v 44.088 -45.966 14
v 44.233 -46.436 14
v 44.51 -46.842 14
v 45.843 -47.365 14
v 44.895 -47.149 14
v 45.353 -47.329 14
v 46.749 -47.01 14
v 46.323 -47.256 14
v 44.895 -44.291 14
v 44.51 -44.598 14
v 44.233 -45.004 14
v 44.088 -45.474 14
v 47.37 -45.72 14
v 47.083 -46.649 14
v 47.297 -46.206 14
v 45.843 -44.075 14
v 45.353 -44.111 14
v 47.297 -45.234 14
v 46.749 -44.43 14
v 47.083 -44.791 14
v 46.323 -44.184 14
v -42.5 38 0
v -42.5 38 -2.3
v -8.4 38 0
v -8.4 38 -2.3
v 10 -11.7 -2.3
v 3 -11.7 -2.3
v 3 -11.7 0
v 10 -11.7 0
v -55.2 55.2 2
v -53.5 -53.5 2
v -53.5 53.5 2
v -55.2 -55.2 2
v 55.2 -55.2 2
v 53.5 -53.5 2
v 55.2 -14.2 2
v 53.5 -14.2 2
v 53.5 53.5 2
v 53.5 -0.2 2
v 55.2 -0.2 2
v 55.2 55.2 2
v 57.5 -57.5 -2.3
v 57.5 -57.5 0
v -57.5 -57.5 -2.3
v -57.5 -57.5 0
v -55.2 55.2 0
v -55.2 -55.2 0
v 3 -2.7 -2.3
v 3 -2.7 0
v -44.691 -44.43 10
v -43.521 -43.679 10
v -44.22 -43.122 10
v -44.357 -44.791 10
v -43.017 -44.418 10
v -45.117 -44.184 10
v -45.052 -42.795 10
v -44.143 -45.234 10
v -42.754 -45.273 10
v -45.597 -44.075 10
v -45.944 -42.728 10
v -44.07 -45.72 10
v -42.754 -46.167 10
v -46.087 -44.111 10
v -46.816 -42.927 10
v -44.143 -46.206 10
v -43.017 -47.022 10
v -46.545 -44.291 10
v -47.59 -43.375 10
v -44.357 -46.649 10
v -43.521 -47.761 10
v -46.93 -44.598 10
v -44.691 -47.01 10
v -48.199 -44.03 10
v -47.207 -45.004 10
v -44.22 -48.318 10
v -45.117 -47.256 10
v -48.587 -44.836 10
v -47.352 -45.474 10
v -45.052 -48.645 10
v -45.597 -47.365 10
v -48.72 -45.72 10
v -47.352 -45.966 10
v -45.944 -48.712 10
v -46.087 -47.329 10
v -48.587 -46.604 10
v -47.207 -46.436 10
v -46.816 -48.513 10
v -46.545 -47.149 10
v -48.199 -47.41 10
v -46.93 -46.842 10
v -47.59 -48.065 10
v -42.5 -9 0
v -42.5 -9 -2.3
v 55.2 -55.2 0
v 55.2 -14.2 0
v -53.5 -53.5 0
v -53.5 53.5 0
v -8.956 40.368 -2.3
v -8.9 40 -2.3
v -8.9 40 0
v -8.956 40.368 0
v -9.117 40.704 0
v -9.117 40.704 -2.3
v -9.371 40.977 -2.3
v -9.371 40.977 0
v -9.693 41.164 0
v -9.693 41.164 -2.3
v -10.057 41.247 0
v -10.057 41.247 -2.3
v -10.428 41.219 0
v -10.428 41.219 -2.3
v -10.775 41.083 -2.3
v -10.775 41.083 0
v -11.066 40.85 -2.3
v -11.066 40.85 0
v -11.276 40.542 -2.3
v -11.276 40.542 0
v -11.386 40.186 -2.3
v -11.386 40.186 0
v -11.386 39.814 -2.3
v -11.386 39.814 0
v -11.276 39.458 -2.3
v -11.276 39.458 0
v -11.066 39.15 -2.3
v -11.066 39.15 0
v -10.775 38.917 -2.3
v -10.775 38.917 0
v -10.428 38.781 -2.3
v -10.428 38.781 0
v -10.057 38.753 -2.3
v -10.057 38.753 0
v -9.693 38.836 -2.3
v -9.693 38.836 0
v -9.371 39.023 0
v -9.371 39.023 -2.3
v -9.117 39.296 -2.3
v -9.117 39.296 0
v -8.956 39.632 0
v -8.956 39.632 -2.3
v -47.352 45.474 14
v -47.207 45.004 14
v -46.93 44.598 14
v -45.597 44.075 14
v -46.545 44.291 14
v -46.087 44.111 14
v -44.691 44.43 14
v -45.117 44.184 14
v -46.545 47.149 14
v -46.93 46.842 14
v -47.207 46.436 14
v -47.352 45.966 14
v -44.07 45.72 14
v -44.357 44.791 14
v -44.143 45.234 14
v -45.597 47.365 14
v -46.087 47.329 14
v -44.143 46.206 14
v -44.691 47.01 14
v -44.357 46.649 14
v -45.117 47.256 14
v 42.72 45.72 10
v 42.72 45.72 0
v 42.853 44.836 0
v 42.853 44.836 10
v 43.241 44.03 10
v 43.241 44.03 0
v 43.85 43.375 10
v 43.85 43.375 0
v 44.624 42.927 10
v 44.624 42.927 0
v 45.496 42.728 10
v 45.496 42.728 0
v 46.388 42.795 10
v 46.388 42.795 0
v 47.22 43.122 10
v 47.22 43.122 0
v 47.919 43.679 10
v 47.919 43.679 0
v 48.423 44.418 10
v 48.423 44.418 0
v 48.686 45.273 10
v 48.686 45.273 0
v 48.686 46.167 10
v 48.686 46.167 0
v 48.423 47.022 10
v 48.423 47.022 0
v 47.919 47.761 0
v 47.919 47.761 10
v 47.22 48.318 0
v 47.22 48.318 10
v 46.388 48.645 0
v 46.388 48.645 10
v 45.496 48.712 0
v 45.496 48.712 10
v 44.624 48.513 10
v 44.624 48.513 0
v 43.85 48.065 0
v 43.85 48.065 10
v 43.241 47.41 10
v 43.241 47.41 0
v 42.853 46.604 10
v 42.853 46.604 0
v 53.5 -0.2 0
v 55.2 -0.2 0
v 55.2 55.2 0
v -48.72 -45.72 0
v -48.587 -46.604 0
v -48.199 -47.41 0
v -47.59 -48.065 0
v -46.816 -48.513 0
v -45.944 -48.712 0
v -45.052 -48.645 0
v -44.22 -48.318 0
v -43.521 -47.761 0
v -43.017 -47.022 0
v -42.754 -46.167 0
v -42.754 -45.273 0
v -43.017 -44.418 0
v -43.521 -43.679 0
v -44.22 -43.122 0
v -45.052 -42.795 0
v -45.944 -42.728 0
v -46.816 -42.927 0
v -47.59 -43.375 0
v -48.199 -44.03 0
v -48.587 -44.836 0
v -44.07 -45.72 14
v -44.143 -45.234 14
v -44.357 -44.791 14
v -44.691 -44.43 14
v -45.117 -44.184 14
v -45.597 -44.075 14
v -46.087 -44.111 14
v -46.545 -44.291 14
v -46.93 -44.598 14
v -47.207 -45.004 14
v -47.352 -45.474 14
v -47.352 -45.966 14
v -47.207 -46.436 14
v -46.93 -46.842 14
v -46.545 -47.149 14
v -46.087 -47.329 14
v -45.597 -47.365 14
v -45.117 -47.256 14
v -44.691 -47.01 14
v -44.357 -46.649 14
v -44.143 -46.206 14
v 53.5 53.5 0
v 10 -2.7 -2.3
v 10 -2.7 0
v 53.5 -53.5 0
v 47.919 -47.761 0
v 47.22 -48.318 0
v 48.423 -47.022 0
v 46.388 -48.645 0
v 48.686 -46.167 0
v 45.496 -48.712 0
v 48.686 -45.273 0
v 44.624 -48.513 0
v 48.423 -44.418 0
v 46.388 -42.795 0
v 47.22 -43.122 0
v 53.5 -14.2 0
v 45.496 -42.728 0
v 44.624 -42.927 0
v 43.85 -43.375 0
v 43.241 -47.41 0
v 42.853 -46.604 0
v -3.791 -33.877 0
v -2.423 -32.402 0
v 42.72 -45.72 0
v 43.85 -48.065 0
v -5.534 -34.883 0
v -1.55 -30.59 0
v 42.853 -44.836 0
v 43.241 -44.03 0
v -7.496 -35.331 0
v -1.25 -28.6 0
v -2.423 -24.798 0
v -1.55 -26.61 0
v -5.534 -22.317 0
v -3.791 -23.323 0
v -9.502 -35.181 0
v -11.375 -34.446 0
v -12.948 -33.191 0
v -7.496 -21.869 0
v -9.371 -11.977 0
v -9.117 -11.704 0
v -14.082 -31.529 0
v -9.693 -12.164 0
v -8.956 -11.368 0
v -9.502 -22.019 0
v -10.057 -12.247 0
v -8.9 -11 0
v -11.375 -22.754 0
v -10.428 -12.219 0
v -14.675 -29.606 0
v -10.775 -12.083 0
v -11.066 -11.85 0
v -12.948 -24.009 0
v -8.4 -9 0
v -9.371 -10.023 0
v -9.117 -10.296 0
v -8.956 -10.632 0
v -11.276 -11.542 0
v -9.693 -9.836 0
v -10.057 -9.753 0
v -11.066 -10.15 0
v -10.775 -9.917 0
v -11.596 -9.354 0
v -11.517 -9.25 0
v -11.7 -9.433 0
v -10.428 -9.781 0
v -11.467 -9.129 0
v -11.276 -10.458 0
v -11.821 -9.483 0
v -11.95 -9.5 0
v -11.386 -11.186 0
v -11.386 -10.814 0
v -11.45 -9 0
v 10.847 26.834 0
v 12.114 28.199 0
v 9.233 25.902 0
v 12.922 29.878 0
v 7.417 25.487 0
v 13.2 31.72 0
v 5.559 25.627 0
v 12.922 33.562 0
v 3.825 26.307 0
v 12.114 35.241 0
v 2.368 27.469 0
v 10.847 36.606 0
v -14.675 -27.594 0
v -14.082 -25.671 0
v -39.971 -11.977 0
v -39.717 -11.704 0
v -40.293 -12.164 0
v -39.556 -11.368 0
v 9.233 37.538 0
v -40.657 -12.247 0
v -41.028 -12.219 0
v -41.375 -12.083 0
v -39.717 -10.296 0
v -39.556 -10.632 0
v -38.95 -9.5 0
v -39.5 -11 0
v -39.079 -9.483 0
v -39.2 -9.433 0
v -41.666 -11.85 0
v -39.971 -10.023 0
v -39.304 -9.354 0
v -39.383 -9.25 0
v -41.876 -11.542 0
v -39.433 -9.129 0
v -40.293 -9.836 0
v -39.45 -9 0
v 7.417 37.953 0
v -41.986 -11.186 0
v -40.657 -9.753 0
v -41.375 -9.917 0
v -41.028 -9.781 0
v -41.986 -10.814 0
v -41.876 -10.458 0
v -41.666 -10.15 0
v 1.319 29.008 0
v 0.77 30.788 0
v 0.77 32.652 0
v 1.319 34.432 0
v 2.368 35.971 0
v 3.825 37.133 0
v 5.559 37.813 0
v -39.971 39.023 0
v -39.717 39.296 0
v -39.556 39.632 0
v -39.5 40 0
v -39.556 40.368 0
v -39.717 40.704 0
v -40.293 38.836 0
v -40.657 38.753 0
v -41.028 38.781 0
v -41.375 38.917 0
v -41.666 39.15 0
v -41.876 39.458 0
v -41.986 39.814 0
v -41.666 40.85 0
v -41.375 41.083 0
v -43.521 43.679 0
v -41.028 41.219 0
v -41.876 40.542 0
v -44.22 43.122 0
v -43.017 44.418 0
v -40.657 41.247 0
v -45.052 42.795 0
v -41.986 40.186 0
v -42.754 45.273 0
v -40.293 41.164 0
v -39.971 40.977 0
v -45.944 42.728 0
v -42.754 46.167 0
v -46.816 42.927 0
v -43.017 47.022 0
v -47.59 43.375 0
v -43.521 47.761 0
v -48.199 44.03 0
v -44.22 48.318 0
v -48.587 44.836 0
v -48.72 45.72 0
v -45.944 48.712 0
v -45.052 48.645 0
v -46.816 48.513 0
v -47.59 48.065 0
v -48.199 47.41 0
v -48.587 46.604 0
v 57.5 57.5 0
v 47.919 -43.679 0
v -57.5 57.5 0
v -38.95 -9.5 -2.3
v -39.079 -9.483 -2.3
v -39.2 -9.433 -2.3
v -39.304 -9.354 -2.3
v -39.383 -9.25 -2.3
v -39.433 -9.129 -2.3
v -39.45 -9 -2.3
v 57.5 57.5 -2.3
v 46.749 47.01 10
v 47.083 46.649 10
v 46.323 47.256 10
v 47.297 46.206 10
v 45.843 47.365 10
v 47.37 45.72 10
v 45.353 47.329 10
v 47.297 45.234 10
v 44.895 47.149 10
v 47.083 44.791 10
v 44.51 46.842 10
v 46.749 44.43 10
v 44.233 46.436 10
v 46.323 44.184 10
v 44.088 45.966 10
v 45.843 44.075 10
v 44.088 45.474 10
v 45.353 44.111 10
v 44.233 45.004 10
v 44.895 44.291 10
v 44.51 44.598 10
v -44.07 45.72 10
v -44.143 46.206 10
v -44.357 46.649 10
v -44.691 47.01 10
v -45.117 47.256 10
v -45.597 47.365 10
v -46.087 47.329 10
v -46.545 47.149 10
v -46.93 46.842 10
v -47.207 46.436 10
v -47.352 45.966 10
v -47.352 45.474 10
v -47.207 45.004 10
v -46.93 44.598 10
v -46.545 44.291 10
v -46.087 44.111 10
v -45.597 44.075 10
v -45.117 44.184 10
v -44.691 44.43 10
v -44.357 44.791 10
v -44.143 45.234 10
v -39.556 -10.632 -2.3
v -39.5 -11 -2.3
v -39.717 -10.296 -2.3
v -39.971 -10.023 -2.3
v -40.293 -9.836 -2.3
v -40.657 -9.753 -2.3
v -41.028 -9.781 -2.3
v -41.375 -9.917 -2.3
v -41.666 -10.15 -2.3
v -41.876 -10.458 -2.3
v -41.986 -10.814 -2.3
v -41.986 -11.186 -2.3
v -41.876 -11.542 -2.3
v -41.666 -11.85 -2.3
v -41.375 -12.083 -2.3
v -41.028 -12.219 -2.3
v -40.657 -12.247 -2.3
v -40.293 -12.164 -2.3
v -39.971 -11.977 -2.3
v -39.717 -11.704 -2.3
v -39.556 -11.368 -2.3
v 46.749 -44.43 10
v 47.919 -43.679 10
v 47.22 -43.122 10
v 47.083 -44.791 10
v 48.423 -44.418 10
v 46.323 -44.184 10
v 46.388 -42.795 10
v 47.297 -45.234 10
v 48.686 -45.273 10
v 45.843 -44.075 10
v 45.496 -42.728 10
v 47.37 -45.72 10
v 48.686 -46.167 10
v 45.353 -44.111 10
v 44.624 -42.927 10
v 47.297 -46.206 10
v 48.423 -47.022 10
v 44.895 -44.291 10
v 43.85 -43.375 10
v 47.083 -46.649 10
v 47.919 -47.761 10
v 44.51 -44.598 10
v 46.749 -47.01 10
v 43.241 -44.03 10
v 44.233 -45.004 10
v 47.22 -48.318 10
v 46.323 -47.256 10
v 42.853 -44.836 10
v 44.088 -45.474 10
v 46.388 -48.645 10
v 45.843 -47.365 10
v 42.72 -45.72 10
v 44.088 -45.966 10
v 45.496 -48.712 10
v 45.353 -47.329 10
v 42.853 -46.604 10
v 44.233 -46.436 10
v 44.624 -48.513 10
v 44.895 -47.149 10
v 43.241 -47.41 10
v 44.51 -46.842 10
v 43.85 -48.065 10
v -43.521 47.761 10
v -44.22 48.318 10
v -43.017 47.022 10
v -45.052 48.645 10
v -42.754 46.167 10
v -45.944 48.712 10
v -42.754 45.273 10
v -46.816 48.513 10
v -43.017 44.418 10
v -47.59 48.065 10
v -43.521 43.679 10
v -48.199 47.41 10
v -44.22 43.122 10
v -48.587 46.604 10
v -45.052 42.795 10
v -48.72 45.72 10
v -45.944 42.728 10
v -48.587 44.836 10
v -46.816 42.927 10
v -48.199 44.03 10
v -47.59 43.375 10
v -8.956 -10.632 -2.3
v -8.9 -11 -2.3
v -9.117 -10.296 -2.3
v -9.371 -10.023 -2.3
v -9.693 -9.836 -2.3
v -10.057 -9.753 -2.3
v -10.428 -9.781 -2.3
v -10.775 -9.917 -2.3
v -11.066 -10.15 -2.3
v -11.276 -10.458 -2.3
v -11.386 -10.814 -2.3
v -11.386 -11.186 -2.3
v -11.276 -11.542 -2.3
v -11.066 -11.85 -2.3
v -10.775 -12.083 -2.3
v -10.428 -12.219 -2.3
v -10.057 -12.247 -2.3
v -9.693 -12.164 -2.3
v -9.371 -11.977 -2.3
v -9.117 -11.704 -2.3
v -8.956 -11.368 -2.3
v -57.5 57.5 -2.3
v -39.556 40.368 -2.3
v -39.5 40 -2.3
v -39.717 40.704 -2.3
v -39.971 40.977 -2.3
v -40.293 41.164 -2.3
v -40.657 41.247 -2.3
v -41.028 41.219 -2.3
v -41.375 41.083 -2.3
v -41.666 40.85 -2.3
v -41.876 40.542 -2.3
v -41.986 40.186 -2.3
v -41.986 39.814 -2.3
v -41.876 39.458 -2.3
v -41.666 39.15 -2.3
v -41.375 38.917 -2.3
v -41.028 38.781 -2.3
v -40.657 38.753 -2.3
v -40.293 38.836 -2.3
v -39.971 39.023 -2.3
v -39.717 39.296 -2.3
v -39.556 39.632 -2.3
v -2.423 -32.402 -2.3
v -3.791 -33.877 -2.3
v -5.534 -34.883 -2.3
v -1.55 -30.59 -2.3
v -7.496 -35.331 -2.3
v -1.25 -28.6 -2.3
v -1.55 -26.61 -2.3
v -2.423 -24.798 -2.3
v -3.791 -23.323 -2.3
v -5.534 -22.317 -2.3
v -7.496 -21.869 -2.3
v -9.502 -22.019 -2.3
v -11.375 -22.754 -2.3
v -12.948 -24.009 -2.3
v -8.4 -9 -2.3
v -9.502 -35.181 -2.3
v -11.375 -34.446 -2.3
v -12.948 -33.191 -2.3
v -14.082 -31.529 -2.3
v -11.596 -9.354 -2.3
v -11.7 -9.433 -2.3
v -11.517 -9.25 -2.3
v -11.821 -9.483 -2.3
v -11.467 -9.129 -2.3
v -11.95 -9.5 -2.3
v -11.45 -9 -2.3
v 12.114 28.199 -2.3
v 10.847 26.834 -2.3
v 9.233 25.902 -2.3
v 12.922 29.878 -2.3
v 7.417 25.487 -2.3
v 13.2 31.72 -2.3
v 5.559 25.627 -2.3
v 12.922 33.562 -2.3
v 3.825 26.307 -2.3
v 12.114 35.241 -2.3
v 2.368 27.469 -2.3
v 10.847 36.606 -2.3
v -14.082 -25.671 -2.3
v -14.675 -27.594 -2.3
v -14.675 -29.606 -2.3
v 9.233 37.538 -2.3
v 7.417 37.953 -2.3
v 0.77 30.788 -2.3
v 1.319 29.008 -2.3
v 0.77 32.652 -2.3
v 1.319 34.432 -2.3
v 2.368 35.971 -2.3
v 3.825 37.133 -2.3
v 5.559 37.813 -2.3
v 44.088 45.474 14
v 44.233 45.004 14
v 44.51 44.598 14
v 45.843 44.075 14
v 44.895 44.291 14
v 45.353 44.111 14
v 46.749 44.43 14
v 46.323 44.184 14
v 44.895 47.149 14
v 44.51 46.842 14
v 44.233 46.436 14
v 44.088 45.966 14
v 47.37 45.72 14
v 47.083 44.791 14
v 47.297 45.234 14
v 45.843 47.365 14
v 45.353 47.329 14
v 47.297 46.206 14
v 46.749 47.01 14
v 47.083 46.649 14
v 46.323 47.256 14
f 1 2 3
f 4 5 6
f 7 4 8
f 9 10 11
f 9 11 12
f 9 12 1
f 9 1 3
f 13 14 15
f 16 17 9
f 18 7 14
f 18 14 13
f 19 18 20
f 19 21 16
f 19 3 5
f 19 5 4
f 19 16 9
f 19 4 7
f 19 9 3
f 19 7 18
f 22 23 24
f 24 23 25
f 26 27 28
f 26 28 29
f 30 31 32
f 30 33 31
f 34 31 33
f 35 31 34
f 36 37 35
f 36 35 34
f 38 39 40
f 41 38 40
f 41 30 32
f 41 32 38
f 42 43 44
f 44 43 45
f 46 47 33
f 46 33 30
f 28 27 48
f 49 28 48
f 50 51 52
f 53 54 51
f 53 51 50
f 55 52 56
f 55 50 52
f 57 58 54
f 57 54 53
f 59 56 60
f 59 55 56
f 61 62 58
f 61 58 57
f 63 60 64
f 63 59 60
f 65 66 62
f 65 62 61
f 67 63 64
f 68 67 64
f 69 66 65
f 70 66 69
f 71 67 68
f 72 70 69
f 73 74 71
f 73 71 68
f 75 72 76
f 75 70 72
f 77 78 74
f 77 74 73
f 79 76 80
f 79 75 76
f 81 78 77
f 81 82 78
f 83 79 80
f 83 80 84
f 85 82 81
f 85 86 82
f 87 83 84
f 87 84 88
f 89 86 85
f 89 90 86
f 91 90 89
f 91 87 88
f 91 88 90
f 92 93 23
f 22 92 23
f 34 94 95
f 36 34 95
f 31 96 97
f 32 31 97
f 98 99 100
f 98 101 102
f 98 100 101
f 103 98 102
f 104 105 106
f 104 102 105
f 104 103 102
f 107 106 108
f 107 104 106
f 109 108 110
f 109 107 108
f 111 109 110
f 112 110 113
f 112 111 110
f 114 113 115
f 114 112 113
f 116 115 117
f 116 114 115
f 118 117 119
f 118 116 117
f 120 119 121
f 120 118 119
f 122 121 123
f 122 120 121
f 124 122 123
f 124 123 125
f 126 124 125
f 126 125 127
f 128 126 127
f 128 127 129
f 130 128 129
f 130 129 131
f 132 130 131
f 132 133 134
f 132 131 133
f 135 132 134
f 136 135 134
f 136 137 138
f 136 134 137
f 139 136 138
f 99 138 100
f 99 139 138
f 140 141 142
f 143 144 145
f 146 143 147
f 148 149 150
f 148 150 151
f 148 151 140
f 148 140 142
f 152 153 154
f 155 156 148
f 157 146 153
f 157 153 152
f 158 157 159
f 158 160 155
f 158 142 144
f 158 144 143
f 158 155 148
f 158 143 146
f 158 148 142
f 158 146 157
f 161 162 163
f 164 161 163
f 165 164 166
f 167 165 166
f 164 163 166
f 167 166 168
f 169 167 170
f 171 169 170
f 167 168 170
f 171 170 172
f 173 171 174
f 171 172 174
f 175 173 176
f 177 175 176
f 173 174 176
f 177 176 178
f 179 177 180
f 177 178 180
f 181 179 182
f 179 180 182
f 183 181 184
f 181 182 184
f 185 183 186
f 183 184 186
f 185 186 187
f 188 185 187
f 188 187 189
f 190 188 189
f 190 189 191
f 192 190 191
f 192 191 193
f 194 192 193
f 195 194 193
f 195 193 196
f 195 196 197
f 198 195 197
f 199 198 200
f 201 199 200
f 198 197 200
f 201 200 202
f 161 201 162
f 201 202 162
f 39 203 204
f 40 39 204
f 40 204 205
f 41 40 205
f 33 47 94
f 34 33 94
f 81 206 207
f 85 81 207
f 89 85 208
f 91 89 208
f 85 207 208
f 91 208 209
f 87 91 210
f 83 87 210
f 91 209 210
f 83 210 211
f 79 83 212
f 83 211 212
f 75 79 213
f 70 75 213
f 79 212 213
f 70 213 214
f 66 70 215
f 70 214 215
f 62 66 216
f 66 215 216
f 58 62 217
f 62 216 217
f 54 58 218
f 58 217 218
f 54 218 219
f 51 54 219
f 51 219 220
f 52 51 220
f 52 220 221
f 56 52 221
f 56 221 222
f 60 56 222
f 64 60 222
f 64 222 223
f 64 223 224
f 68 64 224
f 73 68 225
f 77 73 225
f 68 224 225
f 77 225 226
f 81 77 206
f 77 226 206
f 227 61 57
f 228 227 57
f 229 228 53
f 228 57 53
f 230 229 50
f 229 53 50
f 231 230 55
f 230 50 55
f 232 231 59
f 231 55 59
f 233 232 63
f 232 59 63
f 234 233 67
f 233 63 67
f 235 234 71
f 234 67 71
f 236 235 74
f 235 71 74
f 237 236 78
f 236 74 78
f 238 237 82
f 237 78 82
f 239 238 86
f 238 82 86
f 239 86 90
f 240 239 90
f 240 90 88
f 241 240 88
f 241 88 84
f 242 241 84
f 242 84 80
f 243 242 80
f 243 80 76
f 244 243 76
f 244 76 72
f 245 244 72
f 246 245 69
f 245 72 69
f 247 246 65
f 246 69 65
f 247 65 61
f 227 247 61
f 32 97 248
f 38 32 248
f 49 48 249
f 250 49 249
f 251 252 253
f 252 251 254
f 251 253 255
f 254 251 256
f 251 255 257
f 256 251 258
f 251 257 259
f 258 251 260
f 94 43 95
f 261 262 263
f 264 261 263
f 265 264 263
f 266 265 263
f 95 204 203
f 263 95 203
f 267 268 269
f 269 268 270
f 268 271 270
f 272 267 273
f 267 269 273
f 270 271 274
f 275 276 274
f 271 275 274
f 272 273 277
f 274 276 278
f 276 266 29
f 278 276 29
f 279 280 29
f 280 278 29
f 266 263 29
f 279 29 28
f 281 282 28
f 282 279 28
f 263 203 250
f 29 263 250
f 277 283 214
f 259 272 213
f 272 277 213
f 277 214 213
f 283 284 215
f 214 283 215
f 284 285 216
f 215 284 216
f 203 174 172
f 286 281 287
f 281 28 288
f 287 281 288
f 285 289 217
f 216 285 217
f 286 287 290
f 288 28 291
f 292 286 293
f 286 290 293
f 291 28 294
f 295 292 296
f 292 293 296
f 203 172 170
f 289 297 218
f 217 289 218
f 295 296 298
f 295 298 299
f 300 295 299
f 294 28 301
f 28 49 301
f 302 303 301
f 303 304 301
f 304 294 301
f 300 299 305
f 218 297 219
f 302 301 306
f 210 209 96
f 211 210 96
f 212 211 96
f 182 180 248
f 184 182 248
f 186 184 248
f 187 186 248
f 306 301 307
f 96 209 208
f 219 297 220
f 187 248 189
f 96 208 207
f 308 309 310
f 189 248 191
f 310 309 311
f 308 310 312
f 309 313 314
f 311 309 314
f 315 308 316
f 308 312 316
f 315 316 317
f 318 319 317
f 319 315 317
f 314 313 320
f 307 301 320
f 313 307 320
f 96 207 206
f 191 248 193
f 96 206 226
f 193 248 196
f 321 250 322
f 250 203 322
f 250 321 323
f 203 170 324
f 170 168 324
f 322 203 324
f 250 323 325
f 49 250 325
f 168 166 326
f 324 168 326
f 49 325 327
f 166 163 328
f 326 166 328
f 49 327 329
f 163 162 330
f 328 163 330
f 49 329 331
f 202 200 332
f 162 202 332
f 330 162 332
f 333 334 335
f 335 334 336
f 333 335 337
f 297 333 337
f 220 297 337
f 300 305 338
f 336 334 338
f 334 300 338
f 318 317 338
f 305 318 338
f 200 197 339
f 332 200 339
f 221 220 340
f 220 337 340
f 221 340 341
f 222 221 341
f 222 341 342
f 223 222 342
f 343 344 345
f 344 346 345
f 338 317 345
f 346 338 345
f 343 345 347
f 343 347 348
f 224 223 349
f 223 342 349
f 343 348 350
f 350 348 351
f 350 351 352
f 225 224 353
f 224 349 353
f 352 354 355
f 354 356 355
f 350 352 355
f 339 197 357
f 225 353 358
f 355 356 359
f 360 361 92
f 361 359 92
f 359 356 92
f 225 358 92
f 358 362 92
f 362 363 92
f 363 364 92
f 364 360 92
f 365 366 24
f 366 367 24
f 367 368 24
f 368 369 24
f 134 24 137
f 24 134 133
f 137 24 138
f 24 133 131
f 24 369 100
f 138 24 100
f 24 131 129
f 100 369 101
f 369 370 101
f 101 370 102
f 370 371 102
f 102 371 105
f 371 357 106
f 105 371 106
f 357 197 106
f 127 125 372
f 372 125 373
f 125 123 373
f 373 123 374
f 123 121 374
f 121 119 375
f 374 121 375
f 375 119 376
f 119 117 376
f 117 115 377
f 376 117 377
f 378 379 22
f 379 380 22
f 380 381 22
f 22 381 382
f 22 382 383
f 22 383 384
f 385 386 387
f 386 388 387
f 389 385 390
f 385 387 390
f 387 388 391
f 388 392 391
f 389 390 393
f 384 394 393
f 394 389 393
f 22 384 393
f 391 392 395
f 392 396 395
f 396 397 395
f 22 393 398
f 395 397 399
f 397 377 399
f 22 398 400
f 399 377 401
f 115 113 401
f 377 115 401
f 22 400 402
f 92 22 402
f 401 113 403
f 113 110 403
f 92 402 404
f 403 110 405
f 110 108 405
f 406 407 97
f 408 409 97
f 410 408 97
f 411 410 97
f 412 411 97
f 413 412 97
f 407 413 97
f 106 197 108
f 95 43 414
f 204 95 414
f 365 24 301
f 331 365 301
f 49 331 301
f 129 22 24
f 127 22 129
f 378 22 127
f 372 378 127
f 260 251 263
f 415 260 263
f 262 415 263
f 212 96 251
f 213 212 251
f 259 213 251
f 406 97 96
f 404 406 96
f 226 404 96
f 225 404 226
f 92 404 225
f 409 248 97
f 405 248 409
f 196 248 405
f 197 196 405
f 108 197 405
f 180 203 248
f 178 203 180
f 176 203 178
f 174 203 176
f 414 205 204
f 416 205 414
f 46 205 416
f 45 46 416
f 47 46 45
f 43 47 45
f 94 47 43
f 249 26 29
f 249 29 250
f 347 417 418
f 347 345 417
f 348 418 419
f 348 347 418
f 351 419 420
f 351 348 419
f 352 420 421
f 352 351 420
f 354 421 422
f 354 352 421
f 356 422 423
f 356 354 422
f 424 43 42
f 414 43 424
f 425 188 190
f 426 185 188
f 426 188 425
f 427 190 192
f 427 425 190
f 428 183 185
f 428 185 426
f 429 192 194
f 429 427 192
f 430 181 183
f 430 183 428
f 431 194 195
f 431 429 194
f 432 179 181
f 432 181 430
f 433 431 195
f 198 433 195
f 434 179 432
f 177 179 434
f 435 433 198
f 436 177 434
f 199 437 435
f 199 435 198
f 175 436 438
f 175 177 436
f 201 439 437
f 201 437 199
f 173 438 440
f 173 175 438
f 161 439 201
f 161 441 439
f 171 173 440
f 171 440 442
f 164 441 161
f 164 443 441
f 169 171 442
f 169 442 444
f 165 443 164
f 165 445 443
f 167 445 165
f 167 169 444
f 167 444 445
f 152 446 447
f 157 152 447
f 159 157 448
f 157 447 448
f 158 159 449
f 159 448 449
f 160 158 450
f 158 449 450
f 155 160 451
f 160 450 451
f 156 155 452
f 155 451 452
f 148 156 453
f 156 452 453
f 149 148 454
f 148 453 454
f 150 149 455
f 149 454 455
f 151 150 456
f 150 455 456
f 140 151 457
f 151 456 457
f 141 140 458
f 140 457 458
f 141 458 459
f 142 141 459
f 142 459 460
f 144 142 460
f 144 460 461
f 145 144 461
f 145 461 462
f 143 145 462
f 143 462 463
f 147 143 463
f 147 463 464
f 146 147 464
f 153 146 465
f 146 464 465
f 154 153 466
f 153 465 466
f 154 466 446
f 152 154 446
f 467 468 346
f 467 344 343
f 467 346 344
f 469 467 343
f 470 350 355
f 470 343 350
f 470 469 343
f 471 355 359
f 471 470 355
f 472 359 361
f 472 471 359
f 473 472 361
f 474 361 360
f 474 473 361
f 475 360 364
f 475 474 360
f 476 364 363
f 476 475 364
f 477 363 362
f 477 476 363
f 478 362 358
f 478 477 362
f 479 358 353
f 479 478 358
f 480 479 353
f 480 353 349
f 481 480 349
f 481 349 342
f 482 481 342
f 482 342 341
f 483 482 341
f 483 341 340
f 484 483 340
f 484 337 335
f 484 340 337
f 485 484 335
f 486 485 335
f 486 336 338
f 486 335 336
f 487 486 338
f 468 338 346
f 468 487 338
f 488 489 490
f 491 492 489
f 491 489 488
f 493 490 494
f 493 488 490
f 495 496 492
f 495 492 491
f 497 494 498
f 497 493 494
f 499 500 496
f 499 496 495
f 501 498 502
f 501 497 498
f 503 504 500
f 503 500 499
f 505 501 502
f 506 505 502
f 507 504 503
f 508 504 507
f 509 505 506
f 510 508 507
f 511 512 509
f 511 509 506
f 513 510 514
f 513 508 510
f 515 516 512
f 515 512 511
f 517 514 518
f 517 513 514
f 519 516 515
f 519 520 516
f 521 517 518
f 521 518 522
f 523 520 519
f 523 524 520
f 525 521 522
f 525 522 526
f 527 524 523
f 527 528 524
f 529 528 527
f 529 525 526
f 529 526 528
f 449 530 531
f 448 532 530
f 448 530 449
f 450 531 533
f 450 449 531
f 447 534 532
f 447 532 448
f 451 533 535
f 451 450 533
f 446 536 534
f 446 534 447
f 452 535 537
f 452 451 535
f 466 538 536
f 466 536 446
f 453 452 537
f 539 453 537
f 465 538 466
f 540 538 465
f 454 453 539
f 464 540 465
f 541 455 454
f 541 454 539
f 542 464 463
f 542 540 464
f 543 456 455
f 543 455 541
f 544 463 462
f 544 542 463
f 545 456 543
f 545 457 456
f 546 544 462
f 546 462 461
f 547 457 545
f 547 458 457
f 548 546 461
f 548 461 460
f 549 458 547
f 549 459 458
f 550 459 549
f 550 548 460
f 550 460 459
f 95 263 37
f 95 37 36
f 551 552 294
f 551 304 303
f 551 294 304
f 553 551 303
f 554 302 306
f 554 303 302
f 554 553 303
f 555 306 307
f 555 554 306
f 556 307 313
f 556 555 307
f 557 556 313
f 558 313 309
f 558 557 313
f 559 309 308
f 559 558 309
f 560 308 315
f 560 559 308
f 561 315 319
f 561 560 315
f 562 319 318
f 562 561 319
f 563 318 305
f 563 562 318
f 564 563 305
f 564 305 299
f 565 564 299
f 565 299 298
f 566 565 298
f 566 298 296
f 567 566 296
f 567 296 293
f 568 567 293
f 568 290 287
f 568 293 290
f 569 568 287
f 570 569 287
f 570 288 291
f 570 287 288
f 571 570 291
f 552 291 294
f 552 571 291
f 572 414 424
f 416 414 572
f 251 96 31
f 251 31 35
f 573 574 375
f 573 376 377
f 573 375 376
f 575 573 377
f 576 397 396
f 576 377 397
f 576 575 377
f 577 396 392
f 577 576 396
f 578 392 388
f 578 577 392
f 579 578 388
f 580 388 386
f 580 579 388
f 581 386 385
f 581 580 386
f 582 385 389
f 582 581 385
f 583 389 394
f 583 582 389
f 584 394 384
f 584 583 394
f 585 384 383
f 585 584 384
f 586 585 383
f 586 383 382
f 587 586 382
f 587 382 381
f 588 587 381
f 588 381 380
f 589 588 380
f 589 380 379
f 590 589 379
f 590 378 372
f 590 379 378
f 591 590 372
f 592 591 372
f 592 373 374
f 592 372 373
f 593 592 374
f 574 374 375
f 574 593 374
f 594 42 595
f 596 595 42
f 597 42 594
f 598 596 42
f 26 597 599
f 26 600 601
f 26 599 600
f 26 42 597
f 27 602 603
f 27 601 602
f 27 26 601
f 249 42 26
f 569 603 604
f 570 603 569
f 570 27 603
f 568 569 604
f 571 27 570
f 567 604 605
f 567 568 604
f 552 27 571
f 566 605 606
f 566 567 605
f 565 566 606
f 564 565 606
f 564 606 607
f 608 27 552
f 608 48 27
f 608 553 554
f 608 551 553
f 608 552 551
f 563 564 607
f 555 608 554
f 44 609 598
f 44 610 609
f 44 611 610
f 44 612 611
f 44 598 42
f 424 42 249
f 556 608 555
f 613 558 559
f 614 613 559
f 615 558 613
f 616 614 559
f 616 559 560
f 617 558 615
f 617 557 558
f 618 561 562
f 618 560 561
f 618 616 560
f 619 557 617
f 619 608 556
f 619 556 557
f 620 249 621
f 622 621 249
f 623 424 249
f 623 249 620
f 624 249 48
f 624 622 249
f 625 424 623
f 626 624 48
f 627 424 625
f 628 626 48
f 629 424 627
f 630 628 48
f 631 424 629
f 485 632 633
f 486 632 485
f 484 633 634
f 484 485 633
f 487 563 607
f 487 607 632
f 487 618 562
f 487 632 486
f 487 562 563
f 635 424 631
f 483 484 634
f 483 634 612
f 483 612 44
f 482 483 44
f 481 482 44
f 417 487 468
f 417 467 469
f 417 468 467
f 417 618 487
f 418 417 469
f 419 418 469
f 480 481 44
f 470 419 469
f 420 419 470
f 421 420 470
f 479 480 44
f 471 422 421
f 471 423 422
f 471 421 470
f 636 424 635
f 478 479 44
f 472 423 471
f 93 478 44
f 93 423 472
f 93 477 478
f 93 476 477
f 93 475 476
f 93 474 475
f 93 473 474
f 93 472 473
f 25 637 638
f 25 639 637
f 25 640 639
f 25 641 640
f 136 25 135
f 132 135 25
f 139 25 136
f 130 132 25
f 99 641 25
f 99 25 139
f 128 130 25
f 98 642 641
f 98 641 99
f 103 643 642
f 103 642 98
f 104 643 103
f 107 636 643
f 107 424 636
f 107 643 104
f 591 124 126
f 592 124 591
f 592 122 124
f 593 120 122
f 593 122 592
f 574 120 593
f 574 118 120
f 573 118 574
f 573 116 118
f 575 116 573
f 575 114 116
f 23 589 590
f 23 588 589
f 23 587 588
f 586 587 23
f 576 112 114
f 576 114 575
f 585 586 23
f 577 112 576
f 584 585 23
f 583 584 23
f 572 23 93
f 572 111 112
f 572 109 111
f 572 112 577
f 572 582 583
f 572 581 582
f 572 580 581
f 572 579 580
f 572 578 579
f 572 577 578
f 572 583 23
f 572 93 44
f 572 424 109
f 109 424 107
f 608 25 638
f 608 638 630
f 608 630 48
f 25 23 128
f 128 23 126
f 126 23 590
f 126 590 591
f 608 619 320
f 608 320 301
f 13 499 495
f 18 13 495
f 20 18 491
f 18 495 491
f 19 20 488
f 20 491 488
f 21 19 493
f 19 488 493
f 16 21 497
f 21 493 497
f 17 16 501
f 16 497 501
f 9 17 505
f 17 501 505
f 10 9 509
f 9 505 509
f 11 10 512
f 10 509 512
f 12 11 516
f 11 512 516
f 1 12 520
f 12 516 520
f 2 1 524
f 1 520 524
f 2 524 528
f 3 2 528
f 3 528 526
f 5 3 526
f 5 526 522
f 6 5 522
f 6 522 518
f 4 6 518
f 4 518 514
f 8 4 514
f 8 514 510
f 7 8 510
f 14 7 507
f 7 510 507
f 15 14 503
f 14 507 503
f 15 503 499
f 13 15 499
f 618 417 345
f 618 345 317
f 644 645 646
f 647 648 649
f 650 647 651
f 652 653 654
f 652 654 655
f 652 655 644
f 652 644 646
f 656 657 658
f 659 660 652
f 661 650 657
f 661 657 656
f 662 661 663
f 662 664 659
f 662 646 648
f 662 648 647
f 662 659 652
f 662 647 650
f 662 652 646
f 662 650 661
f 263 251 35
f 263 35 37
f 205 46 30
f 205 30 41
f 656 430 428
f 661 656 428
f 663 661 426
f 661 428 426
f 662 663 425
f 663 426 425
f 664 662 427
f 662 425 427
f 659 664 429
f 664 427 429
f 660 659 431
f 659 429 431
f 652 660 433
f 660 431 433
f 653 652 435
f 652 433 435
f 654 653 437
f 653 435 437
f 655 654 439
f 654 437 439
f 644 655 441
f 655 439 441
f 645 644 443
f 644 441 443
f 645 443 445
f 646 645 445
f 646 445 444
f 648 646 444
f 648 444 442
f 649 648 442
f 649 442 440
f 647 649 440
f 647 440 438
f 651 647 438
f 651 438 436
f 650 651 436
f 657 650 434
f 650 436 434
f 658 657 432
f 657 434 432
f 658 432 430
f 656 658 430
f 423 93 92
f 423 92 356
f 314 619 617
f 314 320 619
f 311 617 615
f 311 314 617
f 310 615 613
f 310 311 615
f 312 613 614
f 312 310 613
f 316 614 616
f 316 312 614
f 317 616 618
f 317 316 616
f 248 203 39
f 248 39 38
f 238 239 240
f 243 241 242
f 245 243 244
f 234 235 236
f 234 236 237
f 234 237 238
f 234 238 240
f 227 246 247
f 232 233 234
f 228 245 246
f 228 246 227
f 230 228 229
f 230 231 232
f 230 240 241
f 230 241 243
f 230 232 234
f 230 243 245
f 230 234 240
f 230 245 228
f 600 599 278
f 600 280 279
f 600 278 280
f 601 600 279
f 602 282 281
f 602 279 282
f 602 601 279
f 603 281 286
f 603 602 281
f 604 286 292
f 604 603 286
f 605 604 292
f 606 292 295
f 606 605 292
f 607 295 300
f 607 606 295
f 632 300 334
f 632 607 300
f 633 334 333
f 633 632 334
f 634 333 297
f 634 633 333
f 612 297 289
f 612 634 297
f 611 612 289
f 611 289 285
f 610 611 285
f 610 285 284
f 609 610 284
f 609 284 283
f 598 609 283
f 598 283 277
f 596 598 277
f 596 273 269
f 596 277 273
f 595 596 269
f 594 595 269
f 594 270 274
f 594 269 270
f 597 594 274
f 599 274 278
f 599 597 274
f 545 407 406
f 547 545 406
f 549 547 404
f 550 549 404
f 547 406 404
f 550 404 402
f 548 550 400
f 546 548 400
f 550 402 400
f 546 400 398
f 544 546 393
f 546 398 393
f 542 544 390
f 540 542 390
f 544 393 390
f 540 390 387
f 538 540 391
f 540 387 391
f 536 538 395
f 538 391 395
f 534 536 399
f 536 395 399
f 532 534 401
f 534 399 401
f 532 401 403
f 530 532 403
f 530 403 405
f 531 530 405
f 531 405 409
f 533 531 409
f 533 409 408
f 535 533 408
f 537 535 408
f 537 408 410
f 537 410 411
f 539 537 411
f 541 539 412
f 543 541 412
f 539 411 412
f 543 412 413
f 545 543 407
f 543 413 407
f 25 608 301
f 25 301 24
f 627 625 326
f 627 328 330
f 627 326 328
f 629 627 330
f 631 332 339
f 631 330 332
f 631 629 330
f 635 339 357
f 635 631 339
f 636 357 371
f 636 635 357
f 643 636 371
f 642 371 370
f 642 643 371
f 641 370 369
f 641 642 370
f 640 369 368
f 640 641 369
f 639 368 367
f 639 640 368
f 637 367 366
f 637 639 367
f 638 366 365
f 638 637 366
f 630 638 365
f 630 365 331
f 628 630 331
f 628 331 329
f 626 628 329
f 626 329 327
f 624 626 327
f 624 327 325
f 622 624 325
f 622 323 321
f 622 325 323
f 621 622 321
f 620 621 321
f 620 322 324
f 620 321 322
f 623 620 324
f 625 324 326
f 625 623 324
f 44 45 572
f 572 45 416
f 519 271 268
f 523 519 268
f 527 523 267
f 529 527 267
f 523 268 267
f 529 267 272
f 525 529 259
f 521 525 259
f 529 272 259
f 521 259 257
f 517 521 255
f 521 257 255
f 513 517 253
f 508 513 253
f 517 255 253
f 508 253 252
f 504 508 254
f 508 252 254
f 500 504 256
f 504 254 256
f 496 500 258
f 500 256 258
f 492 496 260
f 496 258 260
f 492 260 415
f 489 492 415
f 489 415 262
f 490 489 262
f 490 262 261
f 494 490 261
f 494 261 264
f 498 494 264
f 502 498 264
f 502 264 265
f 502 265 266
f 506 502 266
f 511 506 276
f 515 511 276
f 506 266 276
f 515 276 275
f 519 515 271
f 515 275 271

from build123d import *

# Parameters (mm, degrees)
SKETCH1_W               = 110.4
SKETCH1_H               = 110.4
SKETCH1_W_2             = 107
SKETCH1_H_2             = 107
BOSS_EXTRUDE1_DEPTH     = 2
SKETCH3_W               = 115
SKETCH3_H               = 115
BOSS_EXTRUDE2_DEPTH     = 2.3
SKETCH4_R               = 3
BOSS_EXTRUDE3_DEPTH     = 10
CUT_EXTRUDE2_DEPTH      = 82.929848041
CUT_EXTRUDE2_DEPTH_BACK = 82.929848041
SKETCH5_R               = 6.75
SKETCH5_R_2             = 6.25
SKETCH5_R_3             = 1.25
SKETCH5_W               = 7
SKETCH5_H               = 9
SKETCH5_W_2             = 34.1
SKETCH5_H_2             = 47
SKETCH5_W_3             = 28
SKETCH5_H_3             = 1
SKETCH6_R               = 1.65
BOSS_EXTRUDE4_DEPTH     = 4
SKETCH7_W               = 24.147095738
SKETCH7_H               = 14
CUT_EXTRUDE4_DEPTH      = 10
FILLET1_R               = 0.5


with BuildPart() as part:
    # Sketch1 → Boss-Extrude1 (new body)
    with BuildSketch(Plane.XY):
        Rectangle(SKETCH1_W, SKETCH1_H)
        Rectangle(SKETCH1_W_2, SKETCH1_H_2, mode=Mode.SUBTRACT)
    extrude(amount=BOSS_EXTRUDE1_DEPTH)

    # Sketch3 → Boss-Extrude2 (add)
    with BuildSketch(Plane(origin=(0, 0, 0), x_dir=(-1, 0, 0), z_dir=(0, 0, -1))):
        Rectangle(SKETCH3_W, SKETCH3_H)
    extrude(amount=BOSS_EXTRUDE2_DEPTH)

    # Sketch4 → Boss-Extrude3 (add)
    with BuildSketch(Plane.XY):
        with Locations(Location((-45.72, 45.72, 0), (0, 0, 180))):
            Circle(SKETCH4_R)
        with Locations(Location((45.72, 45.72, 0), (0, 0, 180))):
            Circle(SKETCH4_R)
        with Locations(Location((45.72, -45.72, 0), (0, 0, 180))):
            Circle(SKETCH4_R)
        with Locations(Location((-45.72, -45.72, 0), (0, 0, 180))):
            Circle(SKETCH4_R)
    extrude(amount=BOSS_EXTRUDE3_DEPTH)

    # Sketch5 → Cut-Extrude2 (cut, two sides: drawn at the far end of the back side and taken through both)
    with BuildSketch(Plane.XY.offset(-CUT_EXTRUDE2_DEPTH_BACK)):
        with Locations((-8, -28.6)):
            Circle(SKETCH5_R)
        with Locations((6.95, 31.72)):
            Circle(SKETCH5_R_2)
        with Locations((-40.75, -11)):
            Circle(SKETCH5_R_3)
        with Locations((-10.15, -11)):
            Circle(SKETCH5_R_3)
        with Locations((-10.15, 40)):
            Circle(SKETCH5_R_3)
        with Locations((-40.75, 40)):
            Circle(SKETCH5_R_3)
        with Locations((6.5, -7.2)):
            Rectangle(SKETCH5_W, SKETCH5_H)
        with Locations((-25.45, 14.5)):
            Rectangle(SKETCH5_W_2, SKETCH5_H_2)
        with Locations((-25.45, -9)):
            Rectangle(SKETCH5_W_3, SKETCH5_H_3)
    extrude(amount=CUT_EXTRUDE2_DEPTH + CUT_EXTRUDE2_DEPTH_BACK, mode=Mode.SUBTRACT)

    # Sketch6 → Boss-Extrude4 (add)
    with BuildSketch(Plane.XY.offset(10)):
        with Locations((-45.72, 45.72)):
            Circle(SKETCH6_R)
        with Locations((45.72, 45.72)):
            Circle(SKETCH6_R)
        with Locations((45.72, -45.72)):
            Circle(SKETCH6_R)
        with Locations((-45.72, -45.72)):
            Circle(SKETCH6_R)
    extrude(amount=BOSS_EXTRUDE4_DEPTH)

    # Sketch7 → Cut-Extrude4 (cut)
    with BuildSketch(Plane.XY):
        with Locations((57.5, -7.2)):
            Rectangle(SKETCH7_W, SKETCH7_H)
    extrude(amount=CUT_EXTRUDE4_DEPTH, mode=Mode.SUBTRACT)

    # Fillet1
    fillet1_edges = [part.edges().sort_by_distance(p)[0] for p in [
        (-11.45, -9.5, -1.15),
        (-39.45, -9.5, -1.15),
    ]]
    fillet(fillet1_edges, radius=FILLET1_R - 0.0001)  # a hair under: the kernel refuses the full size


solid = part.part
